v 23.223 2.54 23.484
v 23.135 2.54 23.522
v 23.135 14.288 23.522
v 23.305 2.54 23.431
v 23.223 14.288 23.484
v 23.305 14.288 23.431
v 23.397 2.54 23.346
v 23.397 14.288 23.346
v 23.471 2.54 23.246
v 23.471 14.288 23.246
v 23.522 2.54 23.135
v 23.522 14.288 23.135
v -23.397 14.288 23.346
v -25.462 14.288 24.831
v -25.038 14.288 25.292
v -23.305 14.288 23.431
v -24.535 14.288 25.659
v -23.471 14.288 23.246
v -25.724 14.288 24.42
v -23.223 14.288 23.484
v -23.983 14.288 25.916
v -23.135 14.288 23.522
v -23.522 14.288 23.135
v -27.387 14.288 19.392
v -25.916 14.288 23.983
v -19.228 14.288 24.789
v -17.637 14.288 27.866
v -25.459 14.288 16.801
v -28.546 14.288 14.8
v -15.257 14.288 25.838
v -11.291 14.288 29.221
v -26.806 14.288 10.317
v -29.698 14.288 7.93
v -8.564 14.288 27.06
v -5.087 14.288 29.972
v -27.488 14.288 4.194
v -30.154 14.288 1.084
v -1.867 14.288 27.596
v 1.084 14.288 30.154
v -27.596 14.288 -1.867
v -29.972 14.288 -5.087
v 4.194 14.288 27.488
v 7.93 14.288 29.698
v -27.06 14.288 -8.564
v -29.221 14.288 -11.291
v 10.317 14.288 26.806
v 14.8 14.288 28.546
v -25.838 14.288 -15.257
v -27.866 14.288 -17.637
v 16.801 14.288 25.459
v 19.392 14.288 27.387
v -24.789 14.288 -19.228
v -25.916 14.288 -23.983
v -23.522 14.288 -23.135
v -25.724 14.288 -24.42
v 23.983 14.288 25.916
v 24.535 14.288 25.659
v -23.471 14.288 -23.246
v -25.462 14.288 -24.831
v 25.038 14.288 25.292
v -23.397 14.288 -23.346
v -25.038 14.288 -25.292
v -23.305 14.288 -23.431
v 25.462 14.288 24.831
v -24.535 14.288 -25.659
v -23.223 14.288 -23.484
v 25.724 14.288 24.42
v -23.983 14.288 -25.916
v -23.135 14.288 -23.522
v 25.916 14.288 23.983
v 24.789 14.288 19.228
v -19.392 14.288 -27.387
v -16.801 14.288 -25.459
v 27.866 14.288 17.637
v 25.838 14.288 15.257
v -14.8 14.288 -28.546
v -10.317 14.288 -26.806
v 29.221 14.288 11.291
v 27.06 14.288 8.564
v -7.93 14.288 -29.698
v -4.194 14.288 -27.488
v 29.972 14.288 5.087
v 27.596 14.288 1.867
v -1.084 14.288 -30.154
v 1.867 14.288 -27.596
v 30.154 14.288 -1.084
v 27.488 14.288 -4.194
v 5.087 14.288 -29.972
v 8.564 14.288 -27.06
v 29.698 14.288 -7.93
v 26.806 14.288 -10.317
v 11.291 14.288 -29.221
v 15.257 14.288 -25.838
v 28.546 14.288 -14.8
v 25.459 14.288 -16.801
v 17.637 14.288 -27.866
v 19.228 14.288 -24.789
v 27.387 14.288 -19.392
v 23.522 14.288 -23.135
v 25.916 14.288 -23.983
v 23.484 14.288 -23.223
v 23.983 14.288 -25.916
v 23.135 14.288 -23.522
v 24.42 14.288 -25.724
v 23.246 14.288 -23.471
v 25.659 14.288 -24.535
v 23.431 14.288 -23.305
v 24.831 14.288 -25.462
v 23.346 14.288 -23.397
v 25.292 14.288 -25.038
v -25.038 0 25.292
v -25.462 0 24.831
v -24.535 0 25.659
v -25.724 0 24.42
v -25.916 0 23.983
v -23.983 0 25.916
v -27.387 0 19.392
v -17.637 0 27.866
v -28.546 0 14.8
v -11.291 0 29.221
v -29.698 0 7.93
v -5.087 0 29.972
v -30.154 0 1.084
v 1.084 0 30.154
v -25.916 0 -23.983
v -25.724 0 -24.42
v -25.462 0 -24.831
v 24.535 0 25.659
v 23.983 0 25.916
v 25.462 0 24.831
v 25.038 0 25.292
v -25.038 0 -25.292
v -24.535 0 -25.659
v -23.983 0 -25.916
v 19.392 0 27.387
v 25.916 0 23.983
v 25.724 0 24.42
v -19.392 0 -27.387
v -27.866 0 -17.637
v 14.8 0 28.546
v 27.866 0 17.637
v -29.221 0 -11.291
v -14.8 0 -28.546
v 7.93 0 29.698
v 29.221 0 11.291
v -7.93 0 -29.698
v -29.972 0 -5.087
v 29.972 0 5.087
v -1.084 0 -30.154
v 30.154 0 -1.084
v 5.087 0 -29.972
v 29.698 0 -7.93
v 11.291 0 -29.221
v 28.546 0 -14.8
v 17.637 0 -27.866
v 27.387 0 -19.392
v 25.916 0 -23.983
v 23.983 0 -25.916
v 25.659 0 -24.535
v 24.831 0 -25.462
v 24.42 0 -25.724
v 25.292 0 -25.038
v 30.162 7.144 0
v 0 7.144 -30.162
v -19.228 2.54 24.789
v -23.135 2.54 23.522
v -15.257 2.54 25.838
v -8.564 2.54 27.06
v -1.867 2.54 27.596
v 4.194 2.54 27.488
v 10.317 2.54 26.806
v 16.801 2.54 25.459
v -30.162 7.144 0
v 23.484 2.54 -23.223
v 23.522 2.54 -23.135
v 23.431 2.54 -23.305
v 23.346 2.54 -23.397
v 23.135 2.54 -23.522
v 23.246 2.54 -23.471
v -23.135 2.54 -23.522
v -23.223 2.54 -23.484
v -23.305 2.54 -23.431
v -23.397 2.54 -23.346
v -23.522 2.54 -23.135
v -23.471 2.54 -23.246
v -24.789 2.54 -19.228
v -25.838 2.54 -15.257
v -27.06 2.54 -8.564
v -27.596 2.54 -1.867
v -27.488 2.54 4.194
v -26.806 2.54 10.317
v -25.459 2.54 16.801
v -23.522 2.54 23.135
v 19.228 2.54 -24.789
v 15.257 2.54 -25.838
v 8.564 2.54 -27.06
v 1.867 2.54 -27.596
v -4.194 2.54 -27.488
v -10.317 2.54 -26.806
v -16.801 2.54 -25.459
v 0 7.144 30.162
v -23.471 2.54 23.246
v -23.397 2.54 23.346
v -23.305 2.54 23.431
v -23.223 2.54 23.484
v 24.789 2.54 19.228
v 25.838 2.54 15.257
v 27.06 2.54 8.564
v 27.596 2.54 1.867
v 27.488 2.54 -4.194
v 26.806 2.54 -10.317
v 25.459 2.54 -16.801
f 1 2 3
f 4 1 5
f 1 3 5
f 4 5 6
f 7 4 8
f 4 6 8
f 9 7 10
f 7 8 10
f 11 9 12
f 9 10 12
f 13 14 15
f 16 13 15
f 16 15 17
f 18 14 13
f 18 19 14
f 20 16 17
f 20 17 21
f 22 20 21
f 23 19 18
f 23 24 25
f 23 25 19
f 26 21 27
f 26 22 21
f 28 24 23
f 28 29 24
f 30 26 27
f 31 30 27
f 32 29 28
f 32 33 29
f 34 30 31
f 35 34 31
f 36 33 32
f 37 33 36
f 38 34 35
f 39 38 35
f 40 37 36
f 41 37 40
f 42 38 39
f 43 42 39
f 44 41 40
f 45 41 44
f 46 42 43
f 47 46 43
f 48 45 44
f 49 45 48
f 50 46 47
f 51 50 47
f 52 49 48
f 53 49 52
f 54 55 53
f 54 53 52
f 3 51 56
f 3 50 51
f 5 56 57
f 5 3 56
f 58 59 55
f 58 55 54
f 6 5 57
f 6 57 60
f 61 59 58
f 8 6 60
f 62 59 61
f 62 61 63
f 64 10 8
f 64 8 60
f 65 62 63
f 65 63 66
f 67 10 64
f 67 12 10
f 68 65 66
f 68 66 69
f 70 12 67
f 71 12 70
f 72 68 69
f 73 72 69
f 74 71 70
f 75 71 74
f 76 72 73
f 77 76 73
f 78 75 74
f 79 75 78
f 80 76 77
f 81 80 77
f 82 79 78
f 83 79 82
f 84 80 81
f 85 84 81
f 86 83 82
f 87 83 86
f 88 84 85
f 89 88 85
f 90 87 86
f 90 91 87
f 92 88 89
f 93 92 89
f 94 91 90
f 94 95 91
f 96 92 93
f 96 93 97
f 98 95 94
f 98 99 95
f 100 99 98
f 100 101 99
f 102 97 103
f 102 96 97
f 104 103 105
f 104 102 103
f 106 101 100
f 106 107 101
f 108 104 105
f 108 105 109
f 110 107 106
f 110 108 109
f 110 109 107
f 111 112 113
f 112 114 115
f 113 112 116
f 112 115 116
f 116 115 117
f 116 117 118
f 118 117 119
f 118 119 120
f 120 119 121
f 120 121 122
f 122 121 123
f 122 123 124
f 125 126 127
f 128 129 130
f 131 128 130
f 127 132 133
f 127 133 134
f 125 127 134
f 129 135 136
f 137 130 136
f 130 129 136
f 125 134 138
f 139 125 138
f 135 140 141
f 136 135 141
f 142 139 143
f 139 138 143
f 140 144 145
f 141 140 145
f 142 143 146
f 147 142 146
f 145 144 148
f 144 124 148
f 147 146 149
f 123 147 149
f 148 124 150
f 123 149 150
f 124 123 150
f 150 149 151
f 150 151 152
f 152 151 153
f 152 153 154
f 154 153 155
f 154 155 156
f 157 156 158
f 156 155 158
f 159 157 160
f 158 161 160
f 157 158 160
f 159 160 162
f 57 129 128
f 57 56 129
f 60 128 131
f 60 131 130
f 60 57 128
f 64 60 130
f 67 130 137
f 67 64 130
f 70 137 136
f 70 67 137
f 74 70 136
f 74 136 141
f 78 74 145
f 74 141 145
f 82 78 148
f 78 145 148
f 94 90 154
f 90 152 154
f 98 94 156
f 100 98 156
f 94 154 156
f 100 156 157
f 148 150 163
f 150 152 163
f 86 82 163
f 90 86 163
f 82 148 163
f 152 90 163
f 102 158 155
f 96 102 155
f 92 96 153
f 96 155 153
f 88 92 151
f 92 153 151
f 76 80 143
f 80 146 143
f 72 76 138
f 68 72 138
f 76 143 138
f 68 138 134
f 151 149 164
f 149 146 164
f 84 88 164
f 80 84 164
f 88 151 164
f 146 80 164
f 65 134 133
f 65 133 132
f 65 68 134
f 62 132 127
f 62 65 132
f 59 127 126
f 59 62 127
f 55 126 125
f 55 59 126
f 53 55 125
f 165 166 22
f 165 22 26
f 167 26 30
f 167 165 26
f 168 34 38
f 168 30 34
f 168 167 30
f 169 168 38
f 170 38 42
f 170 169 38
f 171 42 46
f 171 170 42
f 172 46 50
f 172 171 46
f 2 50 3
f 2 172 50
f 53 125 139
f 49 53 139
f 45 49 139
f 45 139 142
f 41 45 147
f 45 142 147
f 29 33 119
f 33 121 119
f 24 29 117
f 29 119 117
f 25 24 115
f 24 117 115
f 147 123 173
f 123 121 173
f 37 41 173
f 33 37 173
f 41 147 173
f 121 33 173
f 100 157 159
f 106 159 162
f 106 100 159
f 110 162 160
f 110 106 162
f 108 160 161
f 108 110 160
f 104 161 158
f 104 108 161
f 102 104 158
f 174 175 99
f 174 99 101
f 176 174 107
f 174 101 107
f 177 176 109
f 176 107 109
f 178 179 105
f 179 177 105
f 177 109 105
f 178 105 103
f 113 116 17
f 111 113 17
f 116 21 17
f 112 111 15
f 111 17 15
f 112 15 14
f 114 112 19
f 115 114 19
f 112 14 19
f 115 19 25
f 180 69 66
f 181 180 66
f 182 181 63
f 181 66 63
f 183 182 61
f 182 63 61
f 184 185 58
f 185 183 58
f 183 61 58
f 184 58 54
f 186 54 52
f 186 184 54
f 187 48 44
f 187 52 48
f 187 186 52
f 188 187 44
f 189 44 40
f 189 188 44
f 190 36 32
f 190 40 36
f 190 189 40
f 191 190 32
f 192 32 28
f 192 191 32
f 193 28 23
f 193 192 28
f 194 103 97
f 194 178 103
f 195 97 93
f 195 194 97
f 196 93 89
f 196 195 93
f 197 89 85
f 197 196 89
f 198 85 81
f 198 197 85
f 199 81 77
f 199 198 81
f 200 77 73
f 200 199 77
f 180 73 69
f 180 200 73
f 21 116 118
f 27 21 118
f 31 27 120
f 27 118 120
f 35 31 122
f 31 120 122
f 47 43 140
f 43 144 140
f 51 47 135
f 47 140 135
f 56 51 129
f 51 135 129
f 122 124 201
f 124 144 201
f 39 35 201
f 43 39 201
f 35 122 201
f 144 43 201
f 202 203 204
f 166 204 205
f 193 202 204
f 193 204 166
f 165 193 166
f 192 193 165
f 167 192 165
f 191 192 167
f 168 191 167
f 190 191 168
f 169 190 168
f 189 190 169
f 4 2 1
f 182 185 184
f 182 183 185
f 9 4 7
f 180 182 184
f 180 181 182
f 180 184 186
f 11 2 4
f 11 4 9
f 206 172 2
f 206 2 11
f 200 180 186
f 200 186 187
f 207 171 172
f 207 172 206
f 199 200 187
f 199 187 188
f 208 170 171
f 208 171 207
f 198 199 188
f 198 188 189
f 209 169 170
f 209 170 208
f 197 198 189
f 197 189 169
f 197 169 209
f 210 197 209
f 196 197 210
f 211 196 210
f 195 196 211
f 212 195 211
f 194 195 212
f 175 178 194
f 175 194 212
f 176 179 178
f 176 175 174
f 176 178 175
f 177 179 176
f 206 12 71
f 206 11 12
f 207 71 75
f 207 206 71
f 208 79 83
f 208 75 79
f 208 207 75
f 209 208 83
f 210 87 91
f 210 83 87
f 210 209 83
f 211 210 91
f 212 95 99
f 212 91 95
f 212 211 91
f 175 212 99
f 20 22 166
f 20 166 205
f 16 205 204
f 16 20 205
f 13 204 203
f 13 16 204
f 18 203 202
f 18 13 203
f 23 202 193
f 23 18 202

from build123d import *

# Parameters (mm, degrees)
BOSS_EXTRUDE1_DEPTH = 14.2875
FILLET1_R           = 3.175
SHELL1_T            = -2.54


with BuildPart() as part:
    # Sketch1 → Boss-Extrude1 (new body)
    with BuildSketch(Plane(origin=(0, 0, 0), x_dir=(1, 0, 0), z_dir=(0, 1, 0))):
        with BuildLine():
            Line((0, 0), (-30.1625, 0))
            add(Edge.make_bspline(
                [(-30.1625, 0), (-30.1625, -12.7), (-25.4, -25.4)],
                knots=[0.5, 0.5, 0.5, 1, 1, 1], degree=2))
            add(Edge.make_bspline(
                [(-25.4, -25.4), (-12.7, -30.1625), (0, -30.1625)],
                knots=[0, 0, 0, 0.5, 0.5, 0.5], degree=2))
            Line((0, -30.1625), (0, 0))
        make_face()
        with BuildLine():
            add(Edge.make_bspline(
                [(-25.4, 25.4), (-30.1625, 12.7), (-30.1625, 0)],
                knots=[0, 0, 0, 0.5, 0.5, 0.5], degree=2))
            Line((-30.1625, 0), (0, 0))
            Line((0, 0), (0, 30.1625))
            add(Edge.make_bspline(
                [(-25.4, 25.4), (-12.7, 30.1625), (0, 30.1625)],
                knots=[0, 0, 0, 0.5, 0.5, 0.5], degree=2))
        make_face()
        with BuildLine():
            Line((0, 30.1625), (0, 0))
            Line((0, 0), (30.1625, 0))
            add(Edge.make_bspline(
                [(25.4, 25.4), (30.1625, 12.7), (30.1625, 0)],
                knots=[0, 0, 0, 0.5, 0.5, 0.5], degree=2))
            add(Edge.make_bspline(
                [(0, 30.1625), (12.7, 30.1625), (25.4, 25.4)],
                knots=[0.5, 0.5, 0.5, 1, 1, 1], degree=2))
        make_face()
        with BuildLine():
            Line((30.1625, 0), (0, 0))
            Line((0, 0), (0, -30.1625))
            add(Edge.make_bspline(
                [(0, -30.1625), (12.7, -30.1625), (25.4, -25.4)],
                knots=[0.5, 0.5, 0.5, 1, 1, 1], degree=2))
            add(Edge.make_bspline(
                [(30.1625, 0), (30.1625, -12.7), (25.4, -25.4)],
                knots=[0.5, 0.5, 0.5, 1, 1, 1], degree=2))
        make_face()
    extrude(amount=BOSS_EXTRUDE1_DEPTH)

    # Fillet1
    fillet1_edges = [part.edges().sort_by_distance(p)[0] for p in [
        (-25.4, 7.14375, -25.4),
        (25.4, 7.14375, -25.4),
        (-25.4, 7.14375, 25.4),
        (25.4, 7.14375, 25.4),
    ]]
    fillet(fillet1_edges, radius=FILLET1_R)

    # Shell1
    shell1_openings = [part.faces().sort_by_distance(p)[0] for p in [
        (0, 14.2875, 0),
    ]]
    offset(amount=SHELL1_T, openings=shell1_openings, kind=Kind.INTERSECTION)


solid = part.part
